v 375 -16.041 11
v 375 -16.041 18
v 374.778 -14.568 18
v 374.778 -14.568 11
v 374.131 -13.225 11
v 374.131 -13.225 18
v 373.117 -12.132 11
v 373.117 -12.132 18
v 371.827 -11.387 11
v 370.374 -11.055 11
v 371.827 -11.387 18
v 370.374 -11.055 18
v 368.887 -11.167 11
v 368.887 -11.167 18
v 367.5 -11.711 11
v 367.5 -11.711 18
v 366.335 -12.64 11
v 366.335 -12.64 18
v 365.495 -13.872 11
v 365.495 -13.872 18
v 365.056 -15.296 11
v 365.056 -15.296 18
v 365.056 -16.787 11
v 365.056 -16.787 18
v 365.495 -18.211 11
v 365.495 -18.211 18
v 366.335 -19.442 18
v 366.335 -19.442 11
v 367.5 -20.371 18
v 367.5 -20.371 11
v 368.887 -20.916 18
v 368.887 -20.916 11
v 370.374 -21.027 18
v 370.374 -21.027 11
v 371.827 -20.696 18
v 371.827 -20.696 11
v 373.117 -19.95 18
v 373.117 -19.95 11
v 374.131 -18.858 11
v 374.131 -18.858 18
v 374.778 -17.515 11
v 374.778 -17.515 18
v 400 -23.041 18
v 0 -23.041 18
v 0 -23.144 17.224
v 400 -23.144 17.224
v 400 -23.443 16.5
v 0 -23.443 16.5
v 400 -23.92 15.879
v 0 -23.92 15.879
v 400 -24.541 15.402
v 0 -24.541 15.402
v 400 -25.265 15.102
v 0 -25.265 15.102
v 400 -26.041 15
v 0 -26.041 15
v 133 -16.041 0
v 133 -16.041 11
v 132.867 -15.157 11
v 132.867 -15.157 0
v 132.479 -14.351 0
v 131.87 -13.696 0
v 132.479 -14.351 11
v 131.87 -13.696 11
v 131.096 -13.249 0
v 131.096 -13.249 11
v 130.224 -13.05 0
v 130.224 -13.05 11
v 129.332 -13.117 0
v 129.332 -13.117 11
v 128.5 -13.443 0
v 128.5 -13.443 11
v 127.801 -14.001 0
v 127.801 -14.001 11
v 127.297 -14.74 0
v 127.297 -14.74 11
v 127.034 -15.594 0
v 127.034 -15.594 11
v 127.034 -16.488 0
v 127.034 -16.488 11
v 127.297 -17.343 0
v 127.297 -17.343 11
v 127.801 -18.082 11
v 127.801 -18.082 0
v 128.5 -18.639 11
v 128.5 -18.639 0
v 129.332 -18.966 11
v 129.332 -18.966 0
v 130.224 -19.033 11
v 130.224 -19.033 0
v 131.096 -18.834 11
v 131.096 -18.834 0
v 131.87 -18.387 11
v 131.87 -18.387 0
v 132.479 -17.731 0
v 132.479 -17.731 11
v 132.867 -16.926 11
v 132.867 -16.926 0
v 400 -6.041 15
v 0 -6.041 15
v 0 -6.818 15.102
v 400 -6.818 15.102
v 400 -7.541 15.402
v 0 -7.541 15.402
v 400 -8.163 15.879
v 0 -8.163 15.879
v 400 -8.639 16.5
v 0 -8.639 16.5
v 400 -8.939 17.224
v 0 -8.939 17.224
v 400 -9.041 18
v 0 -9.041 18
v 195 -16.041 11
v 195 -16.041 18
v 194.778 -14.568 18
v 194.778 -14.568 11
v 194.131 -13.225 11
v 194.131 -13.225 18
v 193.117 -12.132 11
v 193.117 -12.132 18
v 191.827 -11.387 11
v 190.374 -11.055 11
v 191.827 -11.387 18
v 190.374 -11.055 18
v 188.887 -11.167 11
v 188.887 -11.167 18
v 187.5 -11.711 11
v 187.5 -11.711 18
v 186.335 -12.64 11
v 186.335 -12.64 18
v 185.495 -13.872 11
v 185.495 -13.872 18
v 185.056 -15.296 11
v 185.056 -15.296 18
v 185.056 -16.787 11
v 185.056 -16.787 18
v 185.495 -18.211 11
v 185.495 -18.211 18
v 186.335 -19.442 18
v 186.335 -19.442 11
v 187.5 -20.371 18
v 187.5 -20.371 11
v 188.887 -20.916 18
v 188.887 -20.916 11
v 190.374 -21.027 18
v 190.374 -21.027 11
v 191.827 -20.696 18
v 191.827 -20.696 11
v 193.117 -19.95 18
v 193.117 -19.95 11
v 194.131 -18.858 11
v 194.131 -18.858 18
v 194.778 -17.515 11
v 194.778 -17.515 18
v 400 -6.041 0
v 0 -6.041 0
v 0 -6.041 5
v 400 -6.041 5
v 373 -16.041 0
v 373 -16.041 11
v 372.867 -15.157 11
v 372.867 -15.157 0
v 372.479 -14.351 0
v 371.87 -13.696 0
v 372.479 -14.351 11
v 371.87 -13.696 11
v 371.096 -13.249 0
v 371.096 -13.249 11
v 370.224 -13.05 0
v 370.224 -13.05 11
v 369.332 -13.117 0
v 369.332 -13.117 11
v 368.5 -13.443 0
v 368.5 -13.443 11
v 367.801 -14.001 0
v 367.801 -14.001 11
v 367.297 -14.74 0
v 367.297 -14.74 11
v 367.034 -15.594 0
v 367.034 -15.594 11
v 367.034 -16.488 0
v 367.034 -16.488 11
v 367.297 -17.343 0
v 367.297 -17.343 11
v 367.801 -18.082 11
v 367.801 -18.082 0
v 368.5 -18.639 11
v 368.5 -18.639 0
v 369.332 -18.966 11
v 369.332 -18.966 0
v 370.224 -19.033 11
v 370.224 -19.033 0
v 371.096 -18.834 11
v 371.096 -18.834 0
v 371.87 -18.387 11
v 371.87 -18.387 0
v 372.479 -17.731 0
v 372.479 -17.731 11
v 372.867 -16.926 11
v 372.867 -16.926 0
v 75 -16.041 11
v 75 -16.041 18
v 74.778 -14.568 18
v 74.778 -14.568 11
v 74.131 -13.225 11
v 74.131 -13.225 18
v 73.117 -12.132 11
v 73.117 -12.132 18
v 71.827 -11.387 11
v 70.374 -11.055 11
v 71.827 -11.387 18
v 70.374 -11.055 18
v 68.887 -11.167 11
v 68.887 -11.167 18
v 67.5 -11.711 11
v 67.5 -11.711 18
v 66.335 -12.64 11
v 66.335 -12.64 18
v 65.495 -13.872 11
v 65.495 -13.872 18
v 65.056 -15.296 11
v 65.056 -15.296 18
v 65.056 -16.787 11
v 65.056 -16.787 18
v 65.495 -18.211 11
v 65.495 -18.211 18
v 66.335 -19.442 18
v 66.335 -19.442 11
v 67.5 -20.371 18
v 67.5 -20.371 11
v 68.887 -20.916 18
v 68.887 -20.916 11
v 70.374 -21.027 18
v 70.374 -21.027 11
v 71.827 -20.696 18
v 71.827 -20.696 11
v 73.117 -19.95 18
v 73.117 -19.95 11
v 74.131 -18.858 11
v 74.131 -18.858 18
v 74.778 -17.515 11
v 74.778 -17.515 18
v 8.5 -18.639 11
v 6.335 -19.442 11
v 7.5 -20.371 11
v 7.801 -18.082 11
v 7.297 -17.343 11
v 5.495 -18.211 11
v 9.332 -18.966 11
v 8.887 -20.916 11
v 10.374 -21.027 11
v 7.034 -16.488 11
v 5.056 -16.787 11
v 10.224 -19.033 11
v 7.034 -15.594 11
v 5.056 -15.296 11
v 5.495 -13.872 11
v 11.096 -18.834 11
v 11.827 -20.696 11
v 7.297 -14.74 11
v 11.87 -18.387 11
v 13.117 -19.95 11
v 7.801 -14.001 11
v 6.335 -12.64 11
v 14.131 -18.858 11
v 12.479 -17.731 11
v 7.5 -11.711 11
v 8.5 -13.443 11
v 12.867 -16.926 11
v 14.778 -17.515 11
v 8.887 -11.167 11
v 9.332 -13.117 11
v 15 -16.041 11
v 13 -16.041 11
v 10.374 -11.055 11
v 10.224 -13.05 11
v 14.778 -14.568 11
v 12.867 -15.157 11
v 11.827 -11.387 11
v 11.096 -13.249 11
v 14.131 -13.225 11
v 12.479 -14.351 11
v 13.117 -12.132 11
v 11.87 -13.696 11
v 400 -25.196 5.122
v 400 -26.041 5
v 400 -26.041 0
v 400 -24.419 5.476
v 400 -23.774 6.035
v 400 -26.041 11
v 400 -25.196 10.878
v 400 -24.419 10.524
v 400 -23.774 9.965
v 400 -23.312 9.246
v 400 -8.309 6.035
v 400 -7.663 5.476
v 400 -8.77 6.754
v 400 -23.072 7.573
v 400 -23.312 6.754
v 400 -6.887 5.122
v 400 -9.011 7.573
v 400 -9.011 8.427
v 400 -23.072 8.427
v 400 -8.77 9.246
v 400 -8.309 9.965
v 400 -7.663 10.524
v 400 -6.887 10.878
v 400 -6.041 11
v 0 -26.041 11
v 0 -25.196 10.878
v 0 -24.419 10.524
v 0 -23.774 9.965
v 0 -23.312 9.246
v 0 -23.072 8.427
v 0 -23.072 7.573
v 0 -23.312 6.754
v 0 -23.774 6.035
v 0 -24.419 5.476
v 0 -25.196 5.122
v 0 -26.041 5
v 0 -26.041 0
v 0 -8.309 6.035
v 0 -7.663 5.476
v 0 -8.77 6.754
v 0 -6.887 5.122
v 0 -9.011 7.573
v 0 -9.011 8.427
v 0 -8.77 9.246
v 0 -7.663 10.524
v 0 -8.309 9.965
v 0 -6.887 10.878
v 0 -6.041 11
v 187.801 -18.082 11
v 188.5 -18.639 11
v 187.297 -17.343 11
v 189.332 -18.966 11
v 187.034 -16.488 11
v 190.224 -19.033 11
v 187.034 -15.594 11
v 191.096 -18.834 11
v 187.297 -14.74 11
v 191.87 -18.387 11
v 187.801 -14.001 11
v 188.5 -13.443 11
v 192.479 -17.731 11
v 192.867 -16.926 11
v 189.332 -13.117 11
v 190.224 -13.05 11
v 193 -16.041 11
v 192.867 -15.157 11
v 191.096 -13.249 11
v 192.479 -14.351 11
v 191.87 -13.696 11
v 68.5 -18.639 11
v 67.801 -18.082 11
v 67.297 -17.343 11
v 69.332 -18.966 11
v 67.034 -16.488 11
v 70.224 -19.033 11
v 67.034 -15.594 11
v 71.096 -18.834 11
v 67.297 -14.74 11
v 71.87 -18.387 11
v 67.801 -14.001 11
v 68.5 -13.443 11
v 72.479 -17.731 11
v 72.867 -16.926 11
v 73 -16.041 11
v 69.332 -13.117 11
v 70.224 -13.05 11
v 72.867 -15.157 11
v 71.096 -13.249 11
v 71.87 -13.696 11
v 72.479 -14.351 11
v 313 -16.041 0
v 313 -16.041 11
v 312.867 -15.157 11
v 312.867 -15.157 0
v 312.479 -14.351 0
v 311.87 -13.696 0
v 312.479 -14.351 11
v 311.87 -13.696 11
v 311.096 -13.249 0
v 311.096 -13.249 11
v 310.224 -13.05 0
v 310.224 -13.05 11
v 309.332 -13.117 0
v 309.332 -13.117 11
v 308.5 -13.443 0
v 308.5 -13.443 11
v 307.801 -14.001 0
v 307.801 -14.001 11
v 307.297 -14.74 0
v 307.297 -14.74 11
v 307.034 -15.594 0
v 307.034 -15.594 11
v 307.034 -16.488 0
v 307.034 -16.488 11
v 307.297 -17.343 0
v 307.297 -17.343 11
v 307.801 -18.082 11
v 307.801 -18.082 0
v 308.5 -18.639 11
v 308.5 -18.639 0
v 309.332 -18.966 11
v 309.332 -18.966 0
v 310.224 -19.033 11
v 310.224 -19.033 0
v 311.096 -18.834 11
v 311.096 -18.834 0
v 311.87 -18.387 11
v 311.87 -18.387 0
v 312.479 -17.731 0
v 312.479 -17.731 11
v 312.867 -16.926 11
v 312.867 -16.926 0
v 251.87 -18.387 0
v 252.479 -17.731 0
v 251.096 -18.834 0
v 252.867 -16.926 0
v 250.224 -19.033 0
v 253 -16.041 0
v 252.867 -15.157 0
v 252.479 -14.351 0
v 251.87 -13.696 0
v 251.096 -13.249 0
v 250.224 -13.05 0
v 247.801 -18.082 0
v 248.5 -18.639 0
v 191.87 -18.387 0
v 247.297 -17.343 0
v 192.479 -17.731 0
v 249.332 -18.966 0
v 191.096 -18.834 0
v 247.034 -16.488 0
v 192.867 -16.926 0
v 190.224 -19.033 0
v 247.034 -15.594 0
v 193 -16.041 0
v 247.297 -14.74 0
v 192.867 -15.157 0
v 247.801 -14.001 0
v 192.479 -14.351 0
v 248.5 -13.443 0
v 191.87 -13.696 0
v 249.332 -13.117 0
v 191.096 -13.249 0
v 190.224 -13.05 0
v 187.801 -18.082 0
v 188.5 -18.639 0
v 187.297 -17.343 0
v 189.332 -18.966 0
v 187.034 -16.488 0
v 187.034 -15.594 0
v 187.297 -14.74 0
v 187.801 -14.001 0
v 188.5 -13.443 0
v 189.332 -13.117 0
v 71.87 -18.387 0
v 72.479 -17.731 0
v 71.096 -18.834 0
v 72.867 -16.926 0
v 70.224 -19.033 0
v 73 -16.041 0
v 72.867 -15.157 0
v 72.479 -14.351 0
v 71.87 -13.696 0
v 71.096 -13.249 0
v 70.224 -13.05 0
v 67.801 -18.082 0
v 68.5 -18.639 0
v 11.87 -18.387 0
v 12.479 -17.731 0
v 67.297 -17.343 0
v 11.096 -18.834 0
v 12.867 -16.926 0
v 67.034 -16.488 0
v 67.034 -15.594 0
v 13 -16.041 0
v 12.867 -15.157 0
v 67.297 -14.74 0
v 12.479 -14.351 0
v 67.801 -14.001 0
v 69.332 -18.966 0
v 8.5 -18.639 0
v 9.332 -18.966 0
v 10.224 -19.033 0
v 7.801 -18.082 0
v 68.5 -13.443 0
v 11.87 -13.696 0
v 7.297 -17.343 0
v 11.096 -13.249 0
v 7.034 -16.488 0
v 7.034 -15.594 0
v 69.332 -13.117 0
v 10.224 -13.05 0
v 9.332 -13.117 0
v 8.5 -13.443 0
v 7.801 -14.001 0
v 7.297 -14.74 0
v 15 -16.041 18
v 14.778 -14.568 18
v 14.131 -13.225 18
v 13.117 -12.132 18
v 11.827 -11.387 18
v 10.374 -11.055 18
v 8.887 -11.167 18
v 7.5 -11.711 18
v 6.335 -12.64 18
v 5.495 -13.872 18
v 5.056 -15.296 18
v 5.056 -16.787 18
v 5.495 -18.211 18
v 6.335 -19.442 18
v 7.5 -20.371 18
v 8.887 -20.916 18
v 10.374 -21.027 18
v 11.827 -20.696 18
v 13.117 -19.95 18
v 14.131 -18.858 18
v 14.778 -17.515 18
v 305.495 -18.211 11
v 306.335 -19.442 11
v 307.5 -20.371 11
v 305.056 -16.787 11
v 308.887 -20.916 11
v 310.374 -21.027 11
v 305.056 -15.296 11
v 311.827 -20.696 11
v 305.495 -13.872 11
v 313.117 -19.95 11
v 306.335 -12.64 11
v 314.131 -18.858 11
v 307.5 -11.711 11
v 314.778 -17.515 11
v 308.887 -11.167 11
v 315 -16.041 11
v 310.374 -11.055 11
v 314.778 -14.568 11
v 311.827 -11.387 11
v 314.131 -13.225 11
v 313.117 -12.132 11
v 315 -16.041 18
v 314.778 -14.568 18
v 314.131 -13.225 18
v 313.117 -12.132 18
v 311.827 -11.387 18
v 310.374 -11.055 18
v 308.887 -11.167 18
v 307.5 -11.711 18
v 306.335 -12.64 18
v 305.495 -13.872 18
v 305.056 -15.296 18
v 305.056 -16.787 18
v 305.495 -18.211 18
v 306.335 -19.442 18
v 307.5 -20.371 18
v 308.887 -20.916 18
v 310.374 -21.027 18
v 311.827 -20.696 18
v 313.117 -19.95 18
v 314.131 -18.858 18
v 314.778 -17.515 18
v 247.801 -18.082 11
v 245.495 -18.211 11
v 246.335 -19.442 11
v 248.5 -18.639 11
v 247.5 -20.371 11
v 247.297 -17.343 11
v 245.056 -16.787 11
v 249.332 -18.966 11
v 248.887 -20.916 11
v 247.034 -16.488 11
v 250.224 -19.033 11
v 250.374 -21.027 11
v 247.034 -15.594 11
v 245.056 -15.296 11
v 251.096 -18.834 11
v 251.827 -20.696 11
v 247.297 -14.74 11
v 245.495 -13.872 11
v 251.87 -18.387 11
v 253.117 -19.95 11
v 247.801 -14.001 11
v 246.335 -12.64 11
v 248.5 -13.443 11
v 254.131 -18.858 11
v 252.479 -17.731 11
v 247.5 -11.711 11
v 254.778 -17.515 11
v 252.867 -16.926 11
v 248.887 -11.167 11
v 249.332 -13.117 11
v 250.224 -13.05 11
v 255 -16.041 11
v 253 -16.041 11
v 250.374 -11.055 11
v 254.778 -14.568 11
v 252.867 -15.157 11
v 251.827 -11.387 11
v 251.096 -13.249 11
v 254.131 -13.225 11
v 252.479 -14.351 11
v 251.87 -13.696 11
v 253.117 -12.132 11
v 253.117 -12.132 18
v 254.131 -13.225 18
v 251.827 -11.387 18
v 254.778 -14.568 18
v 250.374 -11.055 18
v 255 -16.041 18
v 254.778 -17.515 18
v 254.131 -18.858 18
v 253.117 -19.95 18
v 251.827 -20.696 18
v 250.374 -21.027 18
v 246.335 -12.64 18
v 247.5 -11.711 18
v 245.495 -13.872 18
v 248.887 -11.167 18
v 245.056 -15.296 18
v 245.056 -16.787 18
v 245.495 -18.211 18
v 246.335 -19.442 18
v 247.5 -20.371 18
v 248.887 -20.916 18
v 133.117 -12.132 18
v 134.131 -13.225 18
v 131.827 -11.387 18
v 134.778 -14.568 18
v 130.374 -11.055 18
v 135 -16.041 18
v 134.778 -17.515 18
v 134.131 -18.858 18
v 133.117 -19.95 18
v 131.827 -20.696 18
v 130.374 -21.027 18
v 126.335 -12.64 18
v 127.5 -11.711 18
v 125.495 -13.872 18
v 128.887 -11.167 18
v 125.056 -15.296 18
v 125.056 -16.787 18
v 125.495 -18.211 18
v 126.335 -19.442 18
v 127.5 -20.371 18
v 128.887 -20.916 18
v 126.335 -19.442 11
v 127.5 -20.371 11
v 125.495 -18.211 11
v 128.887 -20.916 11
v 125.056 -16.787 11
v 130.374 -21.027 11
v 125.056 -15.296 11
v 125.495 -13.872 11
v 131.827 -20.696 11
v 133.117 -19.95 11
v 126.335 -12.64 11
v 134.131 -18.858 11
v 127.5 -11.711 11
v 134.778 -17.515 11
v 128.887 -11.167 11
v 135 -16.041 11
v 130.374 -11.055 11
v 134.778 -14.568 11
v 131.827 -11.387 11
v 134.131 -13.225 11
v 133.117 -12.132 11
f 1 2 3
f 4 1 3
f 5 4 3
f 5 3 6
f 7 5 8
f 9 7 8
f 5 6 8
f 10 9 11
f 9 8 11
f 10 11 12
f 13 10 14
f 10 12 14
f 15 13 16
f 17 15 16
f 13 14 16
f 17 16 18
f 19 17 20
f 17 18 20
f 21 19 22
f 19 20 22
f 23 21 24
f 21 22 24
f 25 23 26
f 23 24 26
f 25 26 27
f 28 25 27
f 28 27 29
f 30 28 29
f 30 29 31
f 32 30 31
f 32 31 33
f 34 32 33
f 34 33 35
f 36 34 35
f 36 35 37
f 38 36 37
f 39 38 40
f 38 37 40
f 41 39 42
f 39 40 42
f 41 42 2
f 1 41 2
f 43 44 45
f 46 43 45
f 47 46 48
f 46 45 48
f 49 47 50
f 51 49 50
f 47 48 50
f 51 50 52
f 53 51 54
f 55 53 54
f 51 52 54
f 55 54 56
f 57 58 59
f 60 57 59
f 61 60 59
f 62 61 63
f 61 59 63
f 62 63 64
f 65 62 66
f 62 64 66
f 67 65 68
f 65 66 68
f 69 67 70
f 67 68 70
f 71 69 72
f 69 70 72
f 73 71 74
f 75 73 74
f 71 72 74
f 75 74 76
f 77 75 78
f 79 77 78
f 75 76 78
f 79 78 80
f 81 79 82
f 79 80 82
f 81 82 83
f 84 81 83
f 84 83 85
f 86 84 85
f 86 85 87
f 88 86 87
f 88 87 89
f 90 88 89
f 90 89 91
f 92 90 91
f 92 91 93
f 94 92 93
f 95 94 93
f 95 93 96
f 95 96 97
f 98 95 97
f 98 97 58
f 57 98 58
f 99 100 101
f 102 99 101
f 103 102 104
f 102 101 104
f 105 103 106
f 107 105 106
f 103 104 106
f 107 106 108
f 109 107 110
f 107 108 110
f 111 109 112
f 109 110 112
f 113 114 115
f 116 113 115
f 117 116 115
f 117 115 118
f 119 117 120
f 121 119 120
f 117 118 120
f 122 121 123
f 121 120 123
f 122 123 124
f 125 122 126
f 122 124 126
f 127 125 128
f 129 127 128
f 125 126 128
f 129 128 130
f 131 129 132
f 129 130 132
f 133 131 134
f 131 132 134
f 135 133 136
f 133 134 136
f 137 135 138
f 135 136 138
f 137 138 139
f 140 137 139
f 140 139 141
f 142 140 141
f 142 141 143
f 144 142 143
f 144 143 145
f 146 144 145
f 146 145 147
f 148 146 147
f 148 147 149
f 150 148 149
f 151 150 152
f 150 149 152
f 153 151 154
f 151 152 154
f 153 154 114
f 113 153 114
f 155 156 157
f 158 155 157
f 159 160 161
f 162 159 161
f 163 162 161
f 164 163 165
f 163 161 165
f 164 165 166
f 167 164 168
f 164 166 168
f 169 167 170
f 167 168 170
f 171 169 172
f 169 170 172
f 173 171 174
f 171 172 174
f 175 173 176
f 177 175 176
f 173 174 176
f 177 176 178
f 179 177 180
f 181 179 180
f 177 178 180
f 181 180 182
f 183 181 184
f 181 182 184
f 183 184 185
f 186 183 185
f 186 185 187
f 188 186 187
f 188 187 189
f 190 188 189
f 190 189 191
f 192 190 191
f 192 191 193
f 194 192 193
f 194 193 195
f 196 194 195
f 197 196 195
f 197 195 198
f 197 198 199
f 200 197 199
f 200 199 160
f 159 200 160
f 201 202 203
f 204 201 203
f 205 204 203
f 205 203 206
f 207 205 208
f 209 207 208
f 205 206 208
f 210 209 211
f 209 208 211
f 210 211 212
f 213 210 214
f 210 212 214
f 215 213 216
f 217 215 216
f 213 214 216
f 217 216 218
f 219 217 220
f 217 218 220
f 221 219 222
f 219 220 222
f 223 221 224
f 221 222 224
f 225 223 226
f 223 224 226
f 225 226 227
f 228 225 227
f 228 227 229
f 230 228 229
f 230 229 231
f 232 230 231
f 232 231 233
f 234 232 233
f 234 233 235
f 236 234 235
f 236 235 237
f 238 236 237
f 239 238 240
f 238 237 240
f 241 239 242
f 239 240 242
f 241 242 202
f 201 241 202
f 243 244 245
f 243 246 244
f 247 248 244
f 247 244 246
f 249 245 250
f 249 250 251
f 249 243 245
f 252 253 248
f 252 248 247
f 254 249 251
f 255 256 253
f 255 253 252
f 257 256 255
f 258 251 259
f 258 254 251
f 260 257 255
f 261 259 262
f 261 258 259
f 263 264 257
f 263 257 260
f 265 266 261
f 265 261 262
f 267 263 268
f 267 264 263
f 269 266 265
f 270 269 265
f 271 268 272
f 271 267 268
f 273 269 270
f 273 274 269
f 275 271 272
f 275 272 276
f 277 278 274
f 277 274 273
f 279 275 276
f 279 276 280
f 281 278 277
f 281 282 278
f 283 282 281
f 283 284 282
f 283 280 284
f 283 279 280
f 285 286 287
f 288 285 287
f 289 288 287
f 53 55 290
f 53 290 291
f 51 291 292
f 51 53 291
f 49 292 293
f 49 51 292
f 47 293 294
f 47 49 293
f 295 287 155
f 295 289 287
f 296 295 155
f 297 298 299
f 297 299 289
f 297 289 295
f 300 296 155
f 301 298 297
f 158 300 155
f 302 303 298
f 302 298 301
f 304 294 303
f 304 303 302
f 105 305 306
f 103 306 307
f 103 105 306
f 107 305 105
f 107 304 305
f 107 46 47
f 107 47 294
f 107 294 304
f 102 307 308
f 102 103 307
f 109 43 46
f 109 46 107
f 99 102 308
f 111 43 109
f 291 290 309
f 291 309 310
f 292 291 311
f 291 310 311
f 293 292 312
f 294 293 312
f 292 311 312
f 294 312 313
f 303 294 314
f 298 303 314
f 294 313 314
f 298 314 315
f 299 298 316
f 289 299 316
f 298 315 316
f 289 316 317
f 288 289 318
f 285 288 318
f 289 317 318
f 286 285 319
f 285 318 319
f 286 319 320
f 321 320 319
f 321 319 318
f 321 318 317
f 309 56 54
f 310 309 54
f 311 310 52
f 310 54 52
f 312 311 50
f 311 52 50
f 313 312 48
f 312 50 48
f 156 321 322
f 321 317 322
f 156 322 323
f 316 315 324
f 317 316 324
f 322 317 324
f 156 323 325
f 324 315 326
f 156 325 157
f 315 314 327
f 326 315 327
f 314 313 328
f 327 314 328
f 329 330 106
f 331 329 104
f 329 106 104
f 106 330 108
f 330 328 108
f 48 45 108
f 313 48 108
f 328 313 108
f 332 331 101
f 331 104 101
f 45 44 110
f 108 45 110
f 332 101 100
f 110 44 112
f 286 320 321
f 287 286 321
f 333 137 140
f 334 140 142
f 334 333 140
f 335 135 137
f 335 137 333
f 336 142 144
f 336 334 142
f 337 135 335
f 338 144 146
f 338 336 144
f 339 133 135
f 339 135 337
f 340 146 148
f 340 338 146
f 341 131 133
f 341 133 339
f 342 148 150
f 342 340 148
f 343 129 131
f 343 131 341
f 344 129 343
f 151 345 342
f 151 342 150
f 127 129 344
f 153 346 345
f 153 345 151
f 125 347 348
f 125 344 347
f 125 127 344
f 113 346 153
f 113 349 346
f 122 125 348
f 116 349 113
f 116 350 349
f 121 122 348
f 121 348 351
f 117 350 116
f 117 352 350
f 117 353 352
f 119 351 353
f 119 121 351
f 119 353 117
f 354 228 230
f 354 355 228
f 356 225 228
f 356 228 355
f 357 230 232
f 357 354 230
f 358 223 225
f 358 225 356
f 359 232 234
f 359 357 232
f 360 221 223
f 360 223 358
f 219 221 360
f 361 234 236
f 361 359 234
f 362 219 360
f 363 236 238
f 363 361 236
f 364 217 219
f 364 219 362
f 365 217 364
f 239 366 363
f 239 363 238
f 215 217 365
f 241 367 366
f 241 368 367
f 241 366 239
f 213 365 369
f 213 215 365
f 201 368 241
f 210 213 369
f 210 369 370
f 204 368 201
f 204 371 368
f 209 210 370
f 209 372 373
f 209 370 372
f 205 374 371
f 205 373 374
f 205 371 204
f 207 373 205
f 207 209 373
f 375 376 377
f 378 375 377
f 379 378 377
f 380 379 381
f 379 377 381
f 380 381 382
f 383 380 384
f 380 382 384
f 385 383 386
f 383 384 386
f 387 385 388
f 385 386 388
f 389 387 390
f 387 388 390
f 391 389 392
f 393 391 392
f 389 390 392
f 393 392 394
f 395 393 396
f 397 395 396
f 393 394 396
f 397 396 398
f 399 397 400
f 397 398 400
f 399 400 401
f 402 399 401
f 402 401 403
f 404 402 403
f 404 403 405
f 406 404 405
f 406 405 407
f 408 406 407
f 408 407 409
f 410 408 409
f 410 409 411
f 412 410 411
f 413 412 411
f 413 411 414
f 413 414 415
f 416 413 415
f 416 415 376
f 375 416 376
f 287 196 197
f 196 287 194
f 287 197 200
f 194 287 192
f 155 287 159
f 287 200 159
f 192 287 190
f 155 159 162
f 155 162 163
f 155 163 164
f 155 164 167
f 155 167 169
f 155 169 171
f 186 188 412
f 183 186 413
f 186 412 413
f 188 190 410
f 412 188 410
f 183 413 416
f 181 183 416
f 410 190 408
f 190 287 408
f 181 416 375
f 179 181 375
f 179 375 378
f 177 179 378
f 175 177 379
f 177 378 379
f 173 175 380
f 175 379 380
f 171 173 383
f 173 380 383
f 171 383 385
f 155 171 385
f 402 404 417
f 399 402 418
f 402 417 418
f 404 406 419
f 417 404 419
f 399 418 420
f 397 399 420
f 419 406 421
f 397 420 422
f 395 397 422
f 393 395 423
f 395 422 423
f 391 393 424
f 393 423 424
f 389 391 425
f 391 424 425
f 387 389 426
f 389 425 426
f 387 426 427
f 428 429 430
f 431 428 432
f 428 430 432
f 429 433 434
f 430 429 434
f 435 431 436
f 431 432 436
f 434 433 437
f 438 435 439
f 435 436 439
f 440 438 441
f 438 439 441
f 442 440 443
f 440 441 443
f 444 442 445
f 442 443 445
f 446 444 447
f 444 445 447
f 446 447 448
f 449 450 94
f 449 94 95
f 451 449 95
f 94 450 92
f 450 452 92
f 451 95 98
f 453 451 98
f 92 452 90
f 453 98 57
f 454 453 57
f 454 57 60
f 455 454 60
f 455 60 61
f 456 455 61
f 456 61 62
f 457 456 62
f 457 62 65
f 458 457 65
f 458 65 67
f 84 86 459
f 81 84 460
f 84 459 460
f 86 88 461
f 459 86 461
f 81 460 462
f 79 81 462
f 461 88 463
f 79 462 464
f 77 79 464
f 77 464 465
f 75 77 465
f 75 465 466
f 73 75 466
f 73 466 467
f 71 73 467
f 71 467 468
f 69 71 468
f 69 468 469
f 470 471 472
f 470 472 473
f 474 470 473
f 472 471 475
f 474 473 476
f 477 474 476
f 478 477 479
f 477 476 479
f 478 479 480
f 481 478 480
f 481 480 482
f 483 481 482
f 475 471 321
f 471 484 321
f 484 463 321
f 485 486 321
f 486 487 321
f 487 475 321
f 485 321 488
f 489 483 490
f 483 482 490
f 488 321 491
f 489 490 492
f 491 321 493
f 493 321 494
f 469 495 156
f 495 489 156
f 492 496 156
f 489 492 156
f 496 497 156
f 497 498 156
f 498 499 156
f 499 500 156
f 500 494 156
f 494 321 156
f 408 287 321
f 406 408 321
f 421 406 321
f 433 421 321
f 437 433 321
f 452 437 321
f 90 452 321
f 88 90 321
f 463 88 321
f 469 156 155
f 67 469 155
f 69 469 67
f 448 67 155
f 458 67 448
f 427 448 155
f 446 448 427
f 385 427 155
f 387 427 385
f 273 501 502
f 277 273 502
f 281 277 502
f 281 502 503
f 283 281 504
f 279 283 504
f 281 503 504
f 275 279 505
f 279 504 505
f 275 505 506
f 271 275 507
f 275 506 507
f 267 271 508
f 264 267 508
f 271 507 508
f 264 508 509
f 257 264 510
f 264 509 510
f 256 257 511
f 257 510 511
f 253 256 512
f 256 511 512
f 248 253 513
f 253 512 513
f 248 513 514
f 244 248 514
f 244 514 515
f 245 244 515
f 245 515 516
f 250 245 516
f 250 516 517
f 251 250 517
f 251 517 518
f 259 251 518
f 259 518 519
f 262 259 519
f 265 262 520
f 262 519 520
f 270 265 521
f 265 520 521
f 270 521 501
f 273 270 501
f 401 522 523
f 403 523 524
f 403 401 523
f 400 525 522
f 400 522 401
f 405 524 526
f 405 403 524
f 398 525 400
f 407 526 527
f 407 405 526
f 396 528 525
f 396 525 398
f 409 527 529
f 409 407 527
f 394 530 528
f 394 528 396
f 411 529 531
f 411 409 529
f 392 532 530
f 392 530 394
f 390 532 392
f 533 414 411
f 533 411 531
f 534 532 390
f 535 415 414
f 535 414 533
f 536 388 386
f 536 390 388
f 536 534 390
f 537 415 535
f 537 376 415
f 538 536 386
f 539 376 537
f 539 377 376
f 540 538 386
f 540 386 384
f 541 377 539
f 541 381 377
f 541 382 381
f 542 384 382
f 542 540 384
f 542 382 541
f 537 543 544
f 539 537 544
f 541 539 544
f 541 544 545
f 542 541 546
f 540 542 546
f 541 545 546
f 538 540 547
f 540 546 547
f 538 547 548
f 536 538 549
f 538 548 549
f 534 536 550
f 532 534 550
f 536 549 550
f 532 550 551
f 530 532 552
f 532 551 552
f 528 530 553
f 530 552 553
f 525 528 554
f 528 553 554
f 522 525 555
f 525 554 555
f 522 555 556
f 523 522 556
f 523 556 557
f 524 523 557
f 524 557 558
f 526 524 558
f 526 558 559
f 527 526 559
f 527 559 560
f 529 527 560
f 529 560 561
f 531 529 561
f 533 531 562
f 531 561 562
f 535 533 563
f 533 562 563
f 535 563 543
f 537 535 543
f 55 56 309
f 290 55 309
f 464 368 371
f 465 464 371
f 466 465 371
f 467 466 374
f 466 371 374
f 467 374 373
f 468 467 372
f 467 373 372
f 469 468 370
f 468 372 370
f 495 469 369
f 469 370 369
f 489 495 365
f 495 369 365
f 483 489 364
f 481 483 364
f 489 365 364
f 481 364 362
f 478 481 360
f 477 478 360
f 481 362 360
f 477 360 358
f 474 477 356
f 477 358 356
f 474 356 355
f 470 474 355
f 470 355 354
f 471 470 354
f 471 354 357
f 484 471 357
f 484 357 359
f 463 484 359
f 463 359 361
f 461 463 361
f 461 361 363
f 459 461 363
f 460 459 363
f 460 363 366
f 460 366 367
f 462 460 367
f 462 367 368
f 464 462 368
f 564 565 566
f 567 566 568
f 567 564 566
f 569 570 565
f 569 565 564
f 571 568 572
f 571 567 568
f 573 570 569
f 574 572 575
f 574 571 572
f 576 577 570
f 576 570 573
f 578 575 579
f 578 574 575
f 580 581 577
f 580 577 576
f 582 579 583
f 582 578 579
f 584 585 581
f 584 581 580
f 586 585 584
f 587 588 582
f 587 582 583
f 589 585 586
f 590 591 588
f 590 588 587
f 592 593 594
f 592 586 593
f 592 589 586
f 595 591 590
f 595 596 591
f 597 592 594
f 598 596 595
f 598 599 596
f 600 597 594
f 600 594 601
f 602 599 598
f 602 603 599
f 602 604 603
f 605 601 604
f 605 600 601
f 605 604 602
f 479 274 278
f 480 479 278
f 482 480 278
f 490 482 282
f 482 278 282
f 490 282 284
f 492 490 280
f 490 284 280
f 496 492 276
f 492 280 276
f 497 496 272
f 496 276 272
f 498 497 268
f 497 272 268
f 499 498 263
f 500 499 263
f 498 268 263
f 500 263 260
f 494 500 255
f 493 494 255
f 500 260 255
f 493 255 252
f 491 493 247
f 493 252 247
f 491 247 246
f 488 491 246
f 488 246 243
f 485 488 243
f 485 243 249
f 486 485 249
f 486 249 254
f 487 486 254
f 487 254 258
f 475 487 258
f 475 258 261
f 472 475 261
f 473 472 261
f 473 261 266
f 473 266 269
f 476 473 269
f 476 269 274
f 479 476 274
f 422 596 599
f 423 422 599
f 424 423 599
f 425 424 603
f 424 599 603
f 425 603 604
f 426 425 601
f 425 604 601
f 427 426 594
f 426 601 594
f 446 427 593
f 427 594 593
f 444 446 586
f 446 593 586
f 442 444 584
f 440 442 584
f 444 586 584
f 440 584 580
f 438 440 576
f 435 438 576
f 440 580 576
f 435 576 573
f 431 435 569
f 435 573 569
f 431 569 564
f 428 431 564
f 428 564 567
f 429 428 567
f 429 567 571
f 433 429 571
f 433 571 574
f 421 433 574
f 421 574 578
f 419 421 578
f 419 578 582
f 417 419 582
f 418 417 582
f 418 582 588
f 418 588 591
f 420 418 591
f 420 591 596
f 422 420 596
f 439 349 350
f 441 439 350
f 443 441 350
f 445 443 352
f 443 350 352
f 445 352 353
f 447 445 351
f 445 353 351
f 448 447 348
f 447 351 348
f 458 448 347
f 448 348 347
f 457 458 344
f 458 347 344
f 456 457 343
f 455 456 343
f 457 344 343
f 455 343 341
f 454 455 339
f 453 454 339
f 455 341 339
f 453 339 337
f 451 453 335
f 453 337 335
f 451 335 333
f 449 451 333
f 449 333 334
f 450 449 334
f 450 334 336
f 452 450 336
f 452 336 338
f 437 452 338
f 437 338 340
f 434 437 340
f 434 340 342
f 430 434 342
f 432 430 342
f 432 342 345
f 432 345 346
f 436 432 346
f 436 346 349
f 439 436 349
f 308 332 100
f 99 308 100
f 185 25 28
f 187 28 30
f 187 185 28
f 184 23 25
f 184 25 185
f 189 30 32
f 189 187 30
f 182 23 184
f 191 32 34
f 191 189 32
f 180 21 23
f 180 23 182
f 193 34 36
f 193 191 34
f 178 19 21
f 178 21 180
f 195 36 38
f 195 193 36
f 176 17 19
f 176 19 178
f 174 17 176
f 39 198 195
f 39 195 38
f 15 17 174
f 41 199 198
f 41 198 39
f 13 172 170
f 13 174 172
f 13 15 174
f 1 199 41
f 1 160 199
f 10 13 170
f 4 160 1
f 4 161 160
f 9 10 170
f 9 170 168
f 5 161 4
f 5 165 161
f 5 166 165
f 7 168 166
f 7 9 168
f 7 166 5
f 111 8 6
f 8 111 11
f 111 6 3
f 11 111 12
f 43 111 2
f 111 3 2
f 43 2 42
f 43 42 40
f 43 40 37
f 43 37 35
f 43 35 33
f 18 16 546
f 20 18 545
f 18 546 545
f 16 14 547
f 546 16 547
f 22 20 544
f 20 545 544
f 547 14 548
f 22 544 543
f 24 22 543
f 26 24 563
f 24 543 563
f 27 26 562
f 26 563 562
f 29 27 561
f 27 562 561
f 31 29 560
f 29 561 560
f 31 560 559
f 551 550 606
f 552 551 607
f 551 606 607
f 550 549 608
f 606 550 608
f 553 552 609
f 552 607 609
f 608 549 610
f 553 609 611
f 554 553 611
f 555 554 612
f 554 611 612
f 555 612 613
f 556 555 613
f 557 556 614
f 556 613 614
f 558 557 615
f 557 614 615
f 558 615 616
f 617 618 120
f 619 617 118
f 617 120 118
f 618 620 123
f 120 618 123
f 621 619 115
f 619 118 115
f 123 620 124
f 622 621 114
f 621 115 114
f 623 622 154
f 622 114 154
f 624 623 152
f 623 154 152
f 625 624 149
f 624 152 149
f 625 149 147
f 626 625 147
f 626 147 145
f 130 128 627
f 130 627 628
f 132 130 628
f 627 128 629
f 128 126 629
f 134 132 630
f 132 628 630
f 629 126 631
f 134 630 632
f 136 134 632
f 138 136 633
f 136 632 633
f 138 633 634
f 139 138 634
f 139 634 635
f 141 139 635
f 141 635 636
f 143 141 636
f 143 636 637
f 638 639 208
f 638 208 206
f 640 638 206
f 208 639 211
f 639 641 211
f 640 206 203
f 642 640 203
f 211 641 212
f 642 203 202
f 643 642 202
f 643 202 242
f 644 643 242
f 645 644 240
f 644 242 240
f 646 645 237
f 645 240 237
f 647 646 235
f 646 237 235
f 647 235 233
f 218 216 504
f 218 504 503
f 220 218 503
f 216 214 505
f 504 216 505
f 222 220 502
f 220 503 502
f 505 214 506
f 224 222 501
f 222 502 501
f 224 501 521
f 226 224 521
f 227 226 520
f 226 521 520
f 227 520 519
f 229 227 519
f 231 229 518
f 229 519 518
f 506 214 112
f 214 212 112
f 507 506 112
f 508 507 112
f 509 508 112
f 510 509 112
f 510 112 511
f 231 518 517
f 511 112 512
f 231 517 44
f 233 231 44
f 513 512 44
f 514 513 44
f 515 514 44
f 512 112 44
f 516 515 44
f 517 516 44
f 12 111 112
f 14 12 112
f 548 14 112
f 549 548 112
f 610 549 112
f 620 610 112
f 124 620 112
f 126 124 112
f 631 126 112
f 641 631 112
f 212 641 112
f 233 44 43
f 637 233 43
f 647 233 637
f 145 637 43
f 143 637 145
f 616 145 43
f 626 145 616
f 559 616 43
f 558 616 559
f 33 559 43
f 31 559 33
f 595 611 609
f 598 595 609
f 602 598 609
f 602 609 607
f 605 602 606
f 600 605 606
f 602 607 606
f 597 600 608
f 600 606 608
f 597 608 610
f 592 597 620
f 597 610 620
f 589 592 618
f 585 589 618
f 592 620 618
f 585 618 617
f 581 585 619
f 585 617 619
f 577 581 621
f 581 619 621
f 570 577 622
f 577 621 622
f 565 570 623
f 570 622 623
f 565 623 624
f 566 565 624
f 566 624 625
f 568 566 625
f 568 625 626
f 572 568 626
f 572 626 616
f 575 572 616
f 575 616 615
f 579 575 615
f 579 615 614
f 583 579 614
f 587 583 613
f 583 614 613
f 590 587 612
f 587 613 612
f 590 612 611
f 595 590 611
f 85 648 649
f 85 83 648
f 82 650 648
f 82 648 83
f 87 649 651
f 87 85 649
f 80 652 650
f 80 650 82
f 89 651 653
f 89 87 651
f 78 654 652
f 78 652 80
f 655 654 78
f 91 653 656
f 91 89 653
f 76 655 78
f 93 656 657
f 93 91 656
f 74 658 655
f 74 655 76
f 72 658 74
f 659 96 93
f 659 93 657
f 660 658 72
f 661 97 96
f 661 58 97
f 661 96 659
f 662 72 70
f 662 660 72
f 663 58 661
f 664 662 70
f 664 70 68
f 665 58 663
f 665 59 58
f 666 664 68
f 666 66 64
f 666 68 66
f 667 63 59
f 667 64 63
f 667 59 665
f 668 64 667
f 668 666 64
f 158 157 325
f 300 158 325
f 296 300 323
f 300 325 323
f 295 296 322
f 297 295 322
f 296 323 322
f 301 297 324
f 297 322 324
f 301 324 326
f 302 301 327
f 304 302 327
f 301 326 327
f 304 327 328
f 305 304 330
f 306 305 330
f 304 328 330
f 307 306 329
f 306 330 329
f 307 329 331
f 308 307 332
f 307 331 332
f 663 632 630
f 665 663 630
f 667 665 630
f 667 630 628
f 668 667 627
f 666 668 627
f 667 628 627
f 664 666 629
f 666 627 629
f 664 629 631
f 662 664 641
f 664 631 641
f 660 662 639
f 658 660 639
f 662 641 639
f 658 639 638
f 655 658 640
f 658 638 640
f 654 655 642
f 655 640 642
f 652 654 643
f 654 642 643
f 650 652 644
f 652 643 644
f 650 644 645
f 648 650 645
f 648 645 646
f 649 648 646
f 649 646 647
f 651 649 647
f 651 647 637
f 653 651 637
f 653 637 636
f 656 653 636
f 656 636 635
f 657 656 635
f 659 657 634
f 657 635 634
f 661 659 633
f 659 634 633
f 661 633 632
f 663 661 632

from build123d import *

# Parameters (mm, degrees)
F1_DEPTH = 400
F2_R     = 3
F3_DEPTH = 18
F4_R     = 5
F5_DEPTH = 7


with BuildPart() as f1:
    # F0 (on Right) → F1 (new body)
    with BuildSketch(Plane.YZ):
        with BuildLine():
            Line((-26.041336, 5), (-26.041336, 0))
            Line((-26.041336, 0), (-6.041336, 0))
            Line((-6.041336, 0), (-6.041336, 5))
            ThreePointArc((-6.041336, 5), (-9.041336, 8), (-6.041336, 11))
            Line((-6.041336, 11), (-6.041336, 15))
            ThreePointArc((-6.041336, 15), (-8.162657, 15.87868), (-9.041336, 18))
            Line((-9.041336, 18), (-23.041336, 18))
            ThreePointArc((-23.041336, 18), (-23.920016, 15.87868), (-26.041336, 15))
            Line((-26.041336, 15), (-26.041336, 11))
            ThreePointArc((-26.041336, 11), (-23.041336, 8), (-26.041336, 5))
        make_face()
    extrude(amount=F1_DEPTH)

    # F2 (on face) → F3 (cut)
    with BuildSketch(Plane.XY.offset(18)):
        with Locations((10, -16.041336)):
            Circle(F2_R)
        with Locations((70, -16.041336)):
            Circle(F2_R)
        with Locations((130, -16.041336)):
            Circle(F2_R)
        with Locations((190, -16.041336)):
            Circle(F2_R)
        with Locations((250, -16.041336)):
            Circle(F2_R)
        with Locations((310, -16.041336)):
            Circle(F2_R)
        with Locations((370, -16.041336)):
            Circle(F2_R)
        with Locations((430, -16.041336)):
            Circle(F2_R)
        with Locations((490, -16.041336)):
            Circle(F2_R)
        with Locations((550, -16.041336)):
            Circle(F2_R)
        with Locations((610, -16.041336)):
            Circle(F2_R)
        with Locations((670, -16.041336)):
            Circle(F2_R)
        with Locations((730, -16.041336)):
            Circle(F2_R)
        with Locations((790, -16.041336)):
            Circle(F2_R)
        with Locations((850, -16.041336)):
            Circle(F2_R)
        with Locations((910, -16.041336)):
            Circle(F2_R)
        with Locations((970, -16.041336)):
            Circle(F2_R)
        with Locations((1030, -16.041336)):
            Circle(F2_R)
        with Locations((1090, -16.041336)):
            Circle(F2_R)
        with Locations((1150, -16.041336)):
            Circle(F2_R)
        with Locations((1210, -16.041336)):
            Circle(F2_R)
        with Locations((1270, -16.041336)):
            Circle(F2_R)
        with Locations((1330, -16.041336)):
            Circle(F2_R)
        with Locations((1390, -16.041336)):
            Circle(F2_R)
        with Locations((1450, -16.041336)):
            Circle(F2_R)
        with Locations((1510, -16.041336)):
            Circle(F2_R)
        with Locations((1570, -16.041336)):
            Circle(F2_R)
        with Locations((1630, -16.041336)):
            Circle(F2_R)
        with Locations((1690, -16.041336)):
            Circle(F2_R)
        with Locations((1750, -16.041336)):
            Circle(F2_R)
        with Locations((1810, -16.041336)):
            Circle(F2_R)
        with Locations((1870, -16.041336)):
            Circle(F2_R)
        with Locations((1930, -16.041336)):
            Circle(F2_R)
        with Locations((1990, -16.041336)):
            Circle(F2_R)
    extrude(amount=-F3_DEPTH, mode=Mode.SUBTRACT)

    # F4 (on face) → F5 (cut)
    with BuildSketch(Plane.XY.offset(18)):
        with Locations((10, -16.041336)):
            Circle(F4_R)
        with Locations((70, -16.041336)):
            Circle(F4_R)
        with Locations((130, -16.041336)):
            Circle(F4_R)
        with Locations((190, -16.041336)):
            Circle(F4_R)
        with Locations((250, -16.041336)):
            Circle(F4_R)
        with Locations((310, -16.041336)):
            Circle(F4_R)
        with Locations((370, -16.041336)):
            Circle(F4_R)
    extrude(amount=-F5_DEPTH, mode=Mode.SUBTRACT)


solid = f1.part
